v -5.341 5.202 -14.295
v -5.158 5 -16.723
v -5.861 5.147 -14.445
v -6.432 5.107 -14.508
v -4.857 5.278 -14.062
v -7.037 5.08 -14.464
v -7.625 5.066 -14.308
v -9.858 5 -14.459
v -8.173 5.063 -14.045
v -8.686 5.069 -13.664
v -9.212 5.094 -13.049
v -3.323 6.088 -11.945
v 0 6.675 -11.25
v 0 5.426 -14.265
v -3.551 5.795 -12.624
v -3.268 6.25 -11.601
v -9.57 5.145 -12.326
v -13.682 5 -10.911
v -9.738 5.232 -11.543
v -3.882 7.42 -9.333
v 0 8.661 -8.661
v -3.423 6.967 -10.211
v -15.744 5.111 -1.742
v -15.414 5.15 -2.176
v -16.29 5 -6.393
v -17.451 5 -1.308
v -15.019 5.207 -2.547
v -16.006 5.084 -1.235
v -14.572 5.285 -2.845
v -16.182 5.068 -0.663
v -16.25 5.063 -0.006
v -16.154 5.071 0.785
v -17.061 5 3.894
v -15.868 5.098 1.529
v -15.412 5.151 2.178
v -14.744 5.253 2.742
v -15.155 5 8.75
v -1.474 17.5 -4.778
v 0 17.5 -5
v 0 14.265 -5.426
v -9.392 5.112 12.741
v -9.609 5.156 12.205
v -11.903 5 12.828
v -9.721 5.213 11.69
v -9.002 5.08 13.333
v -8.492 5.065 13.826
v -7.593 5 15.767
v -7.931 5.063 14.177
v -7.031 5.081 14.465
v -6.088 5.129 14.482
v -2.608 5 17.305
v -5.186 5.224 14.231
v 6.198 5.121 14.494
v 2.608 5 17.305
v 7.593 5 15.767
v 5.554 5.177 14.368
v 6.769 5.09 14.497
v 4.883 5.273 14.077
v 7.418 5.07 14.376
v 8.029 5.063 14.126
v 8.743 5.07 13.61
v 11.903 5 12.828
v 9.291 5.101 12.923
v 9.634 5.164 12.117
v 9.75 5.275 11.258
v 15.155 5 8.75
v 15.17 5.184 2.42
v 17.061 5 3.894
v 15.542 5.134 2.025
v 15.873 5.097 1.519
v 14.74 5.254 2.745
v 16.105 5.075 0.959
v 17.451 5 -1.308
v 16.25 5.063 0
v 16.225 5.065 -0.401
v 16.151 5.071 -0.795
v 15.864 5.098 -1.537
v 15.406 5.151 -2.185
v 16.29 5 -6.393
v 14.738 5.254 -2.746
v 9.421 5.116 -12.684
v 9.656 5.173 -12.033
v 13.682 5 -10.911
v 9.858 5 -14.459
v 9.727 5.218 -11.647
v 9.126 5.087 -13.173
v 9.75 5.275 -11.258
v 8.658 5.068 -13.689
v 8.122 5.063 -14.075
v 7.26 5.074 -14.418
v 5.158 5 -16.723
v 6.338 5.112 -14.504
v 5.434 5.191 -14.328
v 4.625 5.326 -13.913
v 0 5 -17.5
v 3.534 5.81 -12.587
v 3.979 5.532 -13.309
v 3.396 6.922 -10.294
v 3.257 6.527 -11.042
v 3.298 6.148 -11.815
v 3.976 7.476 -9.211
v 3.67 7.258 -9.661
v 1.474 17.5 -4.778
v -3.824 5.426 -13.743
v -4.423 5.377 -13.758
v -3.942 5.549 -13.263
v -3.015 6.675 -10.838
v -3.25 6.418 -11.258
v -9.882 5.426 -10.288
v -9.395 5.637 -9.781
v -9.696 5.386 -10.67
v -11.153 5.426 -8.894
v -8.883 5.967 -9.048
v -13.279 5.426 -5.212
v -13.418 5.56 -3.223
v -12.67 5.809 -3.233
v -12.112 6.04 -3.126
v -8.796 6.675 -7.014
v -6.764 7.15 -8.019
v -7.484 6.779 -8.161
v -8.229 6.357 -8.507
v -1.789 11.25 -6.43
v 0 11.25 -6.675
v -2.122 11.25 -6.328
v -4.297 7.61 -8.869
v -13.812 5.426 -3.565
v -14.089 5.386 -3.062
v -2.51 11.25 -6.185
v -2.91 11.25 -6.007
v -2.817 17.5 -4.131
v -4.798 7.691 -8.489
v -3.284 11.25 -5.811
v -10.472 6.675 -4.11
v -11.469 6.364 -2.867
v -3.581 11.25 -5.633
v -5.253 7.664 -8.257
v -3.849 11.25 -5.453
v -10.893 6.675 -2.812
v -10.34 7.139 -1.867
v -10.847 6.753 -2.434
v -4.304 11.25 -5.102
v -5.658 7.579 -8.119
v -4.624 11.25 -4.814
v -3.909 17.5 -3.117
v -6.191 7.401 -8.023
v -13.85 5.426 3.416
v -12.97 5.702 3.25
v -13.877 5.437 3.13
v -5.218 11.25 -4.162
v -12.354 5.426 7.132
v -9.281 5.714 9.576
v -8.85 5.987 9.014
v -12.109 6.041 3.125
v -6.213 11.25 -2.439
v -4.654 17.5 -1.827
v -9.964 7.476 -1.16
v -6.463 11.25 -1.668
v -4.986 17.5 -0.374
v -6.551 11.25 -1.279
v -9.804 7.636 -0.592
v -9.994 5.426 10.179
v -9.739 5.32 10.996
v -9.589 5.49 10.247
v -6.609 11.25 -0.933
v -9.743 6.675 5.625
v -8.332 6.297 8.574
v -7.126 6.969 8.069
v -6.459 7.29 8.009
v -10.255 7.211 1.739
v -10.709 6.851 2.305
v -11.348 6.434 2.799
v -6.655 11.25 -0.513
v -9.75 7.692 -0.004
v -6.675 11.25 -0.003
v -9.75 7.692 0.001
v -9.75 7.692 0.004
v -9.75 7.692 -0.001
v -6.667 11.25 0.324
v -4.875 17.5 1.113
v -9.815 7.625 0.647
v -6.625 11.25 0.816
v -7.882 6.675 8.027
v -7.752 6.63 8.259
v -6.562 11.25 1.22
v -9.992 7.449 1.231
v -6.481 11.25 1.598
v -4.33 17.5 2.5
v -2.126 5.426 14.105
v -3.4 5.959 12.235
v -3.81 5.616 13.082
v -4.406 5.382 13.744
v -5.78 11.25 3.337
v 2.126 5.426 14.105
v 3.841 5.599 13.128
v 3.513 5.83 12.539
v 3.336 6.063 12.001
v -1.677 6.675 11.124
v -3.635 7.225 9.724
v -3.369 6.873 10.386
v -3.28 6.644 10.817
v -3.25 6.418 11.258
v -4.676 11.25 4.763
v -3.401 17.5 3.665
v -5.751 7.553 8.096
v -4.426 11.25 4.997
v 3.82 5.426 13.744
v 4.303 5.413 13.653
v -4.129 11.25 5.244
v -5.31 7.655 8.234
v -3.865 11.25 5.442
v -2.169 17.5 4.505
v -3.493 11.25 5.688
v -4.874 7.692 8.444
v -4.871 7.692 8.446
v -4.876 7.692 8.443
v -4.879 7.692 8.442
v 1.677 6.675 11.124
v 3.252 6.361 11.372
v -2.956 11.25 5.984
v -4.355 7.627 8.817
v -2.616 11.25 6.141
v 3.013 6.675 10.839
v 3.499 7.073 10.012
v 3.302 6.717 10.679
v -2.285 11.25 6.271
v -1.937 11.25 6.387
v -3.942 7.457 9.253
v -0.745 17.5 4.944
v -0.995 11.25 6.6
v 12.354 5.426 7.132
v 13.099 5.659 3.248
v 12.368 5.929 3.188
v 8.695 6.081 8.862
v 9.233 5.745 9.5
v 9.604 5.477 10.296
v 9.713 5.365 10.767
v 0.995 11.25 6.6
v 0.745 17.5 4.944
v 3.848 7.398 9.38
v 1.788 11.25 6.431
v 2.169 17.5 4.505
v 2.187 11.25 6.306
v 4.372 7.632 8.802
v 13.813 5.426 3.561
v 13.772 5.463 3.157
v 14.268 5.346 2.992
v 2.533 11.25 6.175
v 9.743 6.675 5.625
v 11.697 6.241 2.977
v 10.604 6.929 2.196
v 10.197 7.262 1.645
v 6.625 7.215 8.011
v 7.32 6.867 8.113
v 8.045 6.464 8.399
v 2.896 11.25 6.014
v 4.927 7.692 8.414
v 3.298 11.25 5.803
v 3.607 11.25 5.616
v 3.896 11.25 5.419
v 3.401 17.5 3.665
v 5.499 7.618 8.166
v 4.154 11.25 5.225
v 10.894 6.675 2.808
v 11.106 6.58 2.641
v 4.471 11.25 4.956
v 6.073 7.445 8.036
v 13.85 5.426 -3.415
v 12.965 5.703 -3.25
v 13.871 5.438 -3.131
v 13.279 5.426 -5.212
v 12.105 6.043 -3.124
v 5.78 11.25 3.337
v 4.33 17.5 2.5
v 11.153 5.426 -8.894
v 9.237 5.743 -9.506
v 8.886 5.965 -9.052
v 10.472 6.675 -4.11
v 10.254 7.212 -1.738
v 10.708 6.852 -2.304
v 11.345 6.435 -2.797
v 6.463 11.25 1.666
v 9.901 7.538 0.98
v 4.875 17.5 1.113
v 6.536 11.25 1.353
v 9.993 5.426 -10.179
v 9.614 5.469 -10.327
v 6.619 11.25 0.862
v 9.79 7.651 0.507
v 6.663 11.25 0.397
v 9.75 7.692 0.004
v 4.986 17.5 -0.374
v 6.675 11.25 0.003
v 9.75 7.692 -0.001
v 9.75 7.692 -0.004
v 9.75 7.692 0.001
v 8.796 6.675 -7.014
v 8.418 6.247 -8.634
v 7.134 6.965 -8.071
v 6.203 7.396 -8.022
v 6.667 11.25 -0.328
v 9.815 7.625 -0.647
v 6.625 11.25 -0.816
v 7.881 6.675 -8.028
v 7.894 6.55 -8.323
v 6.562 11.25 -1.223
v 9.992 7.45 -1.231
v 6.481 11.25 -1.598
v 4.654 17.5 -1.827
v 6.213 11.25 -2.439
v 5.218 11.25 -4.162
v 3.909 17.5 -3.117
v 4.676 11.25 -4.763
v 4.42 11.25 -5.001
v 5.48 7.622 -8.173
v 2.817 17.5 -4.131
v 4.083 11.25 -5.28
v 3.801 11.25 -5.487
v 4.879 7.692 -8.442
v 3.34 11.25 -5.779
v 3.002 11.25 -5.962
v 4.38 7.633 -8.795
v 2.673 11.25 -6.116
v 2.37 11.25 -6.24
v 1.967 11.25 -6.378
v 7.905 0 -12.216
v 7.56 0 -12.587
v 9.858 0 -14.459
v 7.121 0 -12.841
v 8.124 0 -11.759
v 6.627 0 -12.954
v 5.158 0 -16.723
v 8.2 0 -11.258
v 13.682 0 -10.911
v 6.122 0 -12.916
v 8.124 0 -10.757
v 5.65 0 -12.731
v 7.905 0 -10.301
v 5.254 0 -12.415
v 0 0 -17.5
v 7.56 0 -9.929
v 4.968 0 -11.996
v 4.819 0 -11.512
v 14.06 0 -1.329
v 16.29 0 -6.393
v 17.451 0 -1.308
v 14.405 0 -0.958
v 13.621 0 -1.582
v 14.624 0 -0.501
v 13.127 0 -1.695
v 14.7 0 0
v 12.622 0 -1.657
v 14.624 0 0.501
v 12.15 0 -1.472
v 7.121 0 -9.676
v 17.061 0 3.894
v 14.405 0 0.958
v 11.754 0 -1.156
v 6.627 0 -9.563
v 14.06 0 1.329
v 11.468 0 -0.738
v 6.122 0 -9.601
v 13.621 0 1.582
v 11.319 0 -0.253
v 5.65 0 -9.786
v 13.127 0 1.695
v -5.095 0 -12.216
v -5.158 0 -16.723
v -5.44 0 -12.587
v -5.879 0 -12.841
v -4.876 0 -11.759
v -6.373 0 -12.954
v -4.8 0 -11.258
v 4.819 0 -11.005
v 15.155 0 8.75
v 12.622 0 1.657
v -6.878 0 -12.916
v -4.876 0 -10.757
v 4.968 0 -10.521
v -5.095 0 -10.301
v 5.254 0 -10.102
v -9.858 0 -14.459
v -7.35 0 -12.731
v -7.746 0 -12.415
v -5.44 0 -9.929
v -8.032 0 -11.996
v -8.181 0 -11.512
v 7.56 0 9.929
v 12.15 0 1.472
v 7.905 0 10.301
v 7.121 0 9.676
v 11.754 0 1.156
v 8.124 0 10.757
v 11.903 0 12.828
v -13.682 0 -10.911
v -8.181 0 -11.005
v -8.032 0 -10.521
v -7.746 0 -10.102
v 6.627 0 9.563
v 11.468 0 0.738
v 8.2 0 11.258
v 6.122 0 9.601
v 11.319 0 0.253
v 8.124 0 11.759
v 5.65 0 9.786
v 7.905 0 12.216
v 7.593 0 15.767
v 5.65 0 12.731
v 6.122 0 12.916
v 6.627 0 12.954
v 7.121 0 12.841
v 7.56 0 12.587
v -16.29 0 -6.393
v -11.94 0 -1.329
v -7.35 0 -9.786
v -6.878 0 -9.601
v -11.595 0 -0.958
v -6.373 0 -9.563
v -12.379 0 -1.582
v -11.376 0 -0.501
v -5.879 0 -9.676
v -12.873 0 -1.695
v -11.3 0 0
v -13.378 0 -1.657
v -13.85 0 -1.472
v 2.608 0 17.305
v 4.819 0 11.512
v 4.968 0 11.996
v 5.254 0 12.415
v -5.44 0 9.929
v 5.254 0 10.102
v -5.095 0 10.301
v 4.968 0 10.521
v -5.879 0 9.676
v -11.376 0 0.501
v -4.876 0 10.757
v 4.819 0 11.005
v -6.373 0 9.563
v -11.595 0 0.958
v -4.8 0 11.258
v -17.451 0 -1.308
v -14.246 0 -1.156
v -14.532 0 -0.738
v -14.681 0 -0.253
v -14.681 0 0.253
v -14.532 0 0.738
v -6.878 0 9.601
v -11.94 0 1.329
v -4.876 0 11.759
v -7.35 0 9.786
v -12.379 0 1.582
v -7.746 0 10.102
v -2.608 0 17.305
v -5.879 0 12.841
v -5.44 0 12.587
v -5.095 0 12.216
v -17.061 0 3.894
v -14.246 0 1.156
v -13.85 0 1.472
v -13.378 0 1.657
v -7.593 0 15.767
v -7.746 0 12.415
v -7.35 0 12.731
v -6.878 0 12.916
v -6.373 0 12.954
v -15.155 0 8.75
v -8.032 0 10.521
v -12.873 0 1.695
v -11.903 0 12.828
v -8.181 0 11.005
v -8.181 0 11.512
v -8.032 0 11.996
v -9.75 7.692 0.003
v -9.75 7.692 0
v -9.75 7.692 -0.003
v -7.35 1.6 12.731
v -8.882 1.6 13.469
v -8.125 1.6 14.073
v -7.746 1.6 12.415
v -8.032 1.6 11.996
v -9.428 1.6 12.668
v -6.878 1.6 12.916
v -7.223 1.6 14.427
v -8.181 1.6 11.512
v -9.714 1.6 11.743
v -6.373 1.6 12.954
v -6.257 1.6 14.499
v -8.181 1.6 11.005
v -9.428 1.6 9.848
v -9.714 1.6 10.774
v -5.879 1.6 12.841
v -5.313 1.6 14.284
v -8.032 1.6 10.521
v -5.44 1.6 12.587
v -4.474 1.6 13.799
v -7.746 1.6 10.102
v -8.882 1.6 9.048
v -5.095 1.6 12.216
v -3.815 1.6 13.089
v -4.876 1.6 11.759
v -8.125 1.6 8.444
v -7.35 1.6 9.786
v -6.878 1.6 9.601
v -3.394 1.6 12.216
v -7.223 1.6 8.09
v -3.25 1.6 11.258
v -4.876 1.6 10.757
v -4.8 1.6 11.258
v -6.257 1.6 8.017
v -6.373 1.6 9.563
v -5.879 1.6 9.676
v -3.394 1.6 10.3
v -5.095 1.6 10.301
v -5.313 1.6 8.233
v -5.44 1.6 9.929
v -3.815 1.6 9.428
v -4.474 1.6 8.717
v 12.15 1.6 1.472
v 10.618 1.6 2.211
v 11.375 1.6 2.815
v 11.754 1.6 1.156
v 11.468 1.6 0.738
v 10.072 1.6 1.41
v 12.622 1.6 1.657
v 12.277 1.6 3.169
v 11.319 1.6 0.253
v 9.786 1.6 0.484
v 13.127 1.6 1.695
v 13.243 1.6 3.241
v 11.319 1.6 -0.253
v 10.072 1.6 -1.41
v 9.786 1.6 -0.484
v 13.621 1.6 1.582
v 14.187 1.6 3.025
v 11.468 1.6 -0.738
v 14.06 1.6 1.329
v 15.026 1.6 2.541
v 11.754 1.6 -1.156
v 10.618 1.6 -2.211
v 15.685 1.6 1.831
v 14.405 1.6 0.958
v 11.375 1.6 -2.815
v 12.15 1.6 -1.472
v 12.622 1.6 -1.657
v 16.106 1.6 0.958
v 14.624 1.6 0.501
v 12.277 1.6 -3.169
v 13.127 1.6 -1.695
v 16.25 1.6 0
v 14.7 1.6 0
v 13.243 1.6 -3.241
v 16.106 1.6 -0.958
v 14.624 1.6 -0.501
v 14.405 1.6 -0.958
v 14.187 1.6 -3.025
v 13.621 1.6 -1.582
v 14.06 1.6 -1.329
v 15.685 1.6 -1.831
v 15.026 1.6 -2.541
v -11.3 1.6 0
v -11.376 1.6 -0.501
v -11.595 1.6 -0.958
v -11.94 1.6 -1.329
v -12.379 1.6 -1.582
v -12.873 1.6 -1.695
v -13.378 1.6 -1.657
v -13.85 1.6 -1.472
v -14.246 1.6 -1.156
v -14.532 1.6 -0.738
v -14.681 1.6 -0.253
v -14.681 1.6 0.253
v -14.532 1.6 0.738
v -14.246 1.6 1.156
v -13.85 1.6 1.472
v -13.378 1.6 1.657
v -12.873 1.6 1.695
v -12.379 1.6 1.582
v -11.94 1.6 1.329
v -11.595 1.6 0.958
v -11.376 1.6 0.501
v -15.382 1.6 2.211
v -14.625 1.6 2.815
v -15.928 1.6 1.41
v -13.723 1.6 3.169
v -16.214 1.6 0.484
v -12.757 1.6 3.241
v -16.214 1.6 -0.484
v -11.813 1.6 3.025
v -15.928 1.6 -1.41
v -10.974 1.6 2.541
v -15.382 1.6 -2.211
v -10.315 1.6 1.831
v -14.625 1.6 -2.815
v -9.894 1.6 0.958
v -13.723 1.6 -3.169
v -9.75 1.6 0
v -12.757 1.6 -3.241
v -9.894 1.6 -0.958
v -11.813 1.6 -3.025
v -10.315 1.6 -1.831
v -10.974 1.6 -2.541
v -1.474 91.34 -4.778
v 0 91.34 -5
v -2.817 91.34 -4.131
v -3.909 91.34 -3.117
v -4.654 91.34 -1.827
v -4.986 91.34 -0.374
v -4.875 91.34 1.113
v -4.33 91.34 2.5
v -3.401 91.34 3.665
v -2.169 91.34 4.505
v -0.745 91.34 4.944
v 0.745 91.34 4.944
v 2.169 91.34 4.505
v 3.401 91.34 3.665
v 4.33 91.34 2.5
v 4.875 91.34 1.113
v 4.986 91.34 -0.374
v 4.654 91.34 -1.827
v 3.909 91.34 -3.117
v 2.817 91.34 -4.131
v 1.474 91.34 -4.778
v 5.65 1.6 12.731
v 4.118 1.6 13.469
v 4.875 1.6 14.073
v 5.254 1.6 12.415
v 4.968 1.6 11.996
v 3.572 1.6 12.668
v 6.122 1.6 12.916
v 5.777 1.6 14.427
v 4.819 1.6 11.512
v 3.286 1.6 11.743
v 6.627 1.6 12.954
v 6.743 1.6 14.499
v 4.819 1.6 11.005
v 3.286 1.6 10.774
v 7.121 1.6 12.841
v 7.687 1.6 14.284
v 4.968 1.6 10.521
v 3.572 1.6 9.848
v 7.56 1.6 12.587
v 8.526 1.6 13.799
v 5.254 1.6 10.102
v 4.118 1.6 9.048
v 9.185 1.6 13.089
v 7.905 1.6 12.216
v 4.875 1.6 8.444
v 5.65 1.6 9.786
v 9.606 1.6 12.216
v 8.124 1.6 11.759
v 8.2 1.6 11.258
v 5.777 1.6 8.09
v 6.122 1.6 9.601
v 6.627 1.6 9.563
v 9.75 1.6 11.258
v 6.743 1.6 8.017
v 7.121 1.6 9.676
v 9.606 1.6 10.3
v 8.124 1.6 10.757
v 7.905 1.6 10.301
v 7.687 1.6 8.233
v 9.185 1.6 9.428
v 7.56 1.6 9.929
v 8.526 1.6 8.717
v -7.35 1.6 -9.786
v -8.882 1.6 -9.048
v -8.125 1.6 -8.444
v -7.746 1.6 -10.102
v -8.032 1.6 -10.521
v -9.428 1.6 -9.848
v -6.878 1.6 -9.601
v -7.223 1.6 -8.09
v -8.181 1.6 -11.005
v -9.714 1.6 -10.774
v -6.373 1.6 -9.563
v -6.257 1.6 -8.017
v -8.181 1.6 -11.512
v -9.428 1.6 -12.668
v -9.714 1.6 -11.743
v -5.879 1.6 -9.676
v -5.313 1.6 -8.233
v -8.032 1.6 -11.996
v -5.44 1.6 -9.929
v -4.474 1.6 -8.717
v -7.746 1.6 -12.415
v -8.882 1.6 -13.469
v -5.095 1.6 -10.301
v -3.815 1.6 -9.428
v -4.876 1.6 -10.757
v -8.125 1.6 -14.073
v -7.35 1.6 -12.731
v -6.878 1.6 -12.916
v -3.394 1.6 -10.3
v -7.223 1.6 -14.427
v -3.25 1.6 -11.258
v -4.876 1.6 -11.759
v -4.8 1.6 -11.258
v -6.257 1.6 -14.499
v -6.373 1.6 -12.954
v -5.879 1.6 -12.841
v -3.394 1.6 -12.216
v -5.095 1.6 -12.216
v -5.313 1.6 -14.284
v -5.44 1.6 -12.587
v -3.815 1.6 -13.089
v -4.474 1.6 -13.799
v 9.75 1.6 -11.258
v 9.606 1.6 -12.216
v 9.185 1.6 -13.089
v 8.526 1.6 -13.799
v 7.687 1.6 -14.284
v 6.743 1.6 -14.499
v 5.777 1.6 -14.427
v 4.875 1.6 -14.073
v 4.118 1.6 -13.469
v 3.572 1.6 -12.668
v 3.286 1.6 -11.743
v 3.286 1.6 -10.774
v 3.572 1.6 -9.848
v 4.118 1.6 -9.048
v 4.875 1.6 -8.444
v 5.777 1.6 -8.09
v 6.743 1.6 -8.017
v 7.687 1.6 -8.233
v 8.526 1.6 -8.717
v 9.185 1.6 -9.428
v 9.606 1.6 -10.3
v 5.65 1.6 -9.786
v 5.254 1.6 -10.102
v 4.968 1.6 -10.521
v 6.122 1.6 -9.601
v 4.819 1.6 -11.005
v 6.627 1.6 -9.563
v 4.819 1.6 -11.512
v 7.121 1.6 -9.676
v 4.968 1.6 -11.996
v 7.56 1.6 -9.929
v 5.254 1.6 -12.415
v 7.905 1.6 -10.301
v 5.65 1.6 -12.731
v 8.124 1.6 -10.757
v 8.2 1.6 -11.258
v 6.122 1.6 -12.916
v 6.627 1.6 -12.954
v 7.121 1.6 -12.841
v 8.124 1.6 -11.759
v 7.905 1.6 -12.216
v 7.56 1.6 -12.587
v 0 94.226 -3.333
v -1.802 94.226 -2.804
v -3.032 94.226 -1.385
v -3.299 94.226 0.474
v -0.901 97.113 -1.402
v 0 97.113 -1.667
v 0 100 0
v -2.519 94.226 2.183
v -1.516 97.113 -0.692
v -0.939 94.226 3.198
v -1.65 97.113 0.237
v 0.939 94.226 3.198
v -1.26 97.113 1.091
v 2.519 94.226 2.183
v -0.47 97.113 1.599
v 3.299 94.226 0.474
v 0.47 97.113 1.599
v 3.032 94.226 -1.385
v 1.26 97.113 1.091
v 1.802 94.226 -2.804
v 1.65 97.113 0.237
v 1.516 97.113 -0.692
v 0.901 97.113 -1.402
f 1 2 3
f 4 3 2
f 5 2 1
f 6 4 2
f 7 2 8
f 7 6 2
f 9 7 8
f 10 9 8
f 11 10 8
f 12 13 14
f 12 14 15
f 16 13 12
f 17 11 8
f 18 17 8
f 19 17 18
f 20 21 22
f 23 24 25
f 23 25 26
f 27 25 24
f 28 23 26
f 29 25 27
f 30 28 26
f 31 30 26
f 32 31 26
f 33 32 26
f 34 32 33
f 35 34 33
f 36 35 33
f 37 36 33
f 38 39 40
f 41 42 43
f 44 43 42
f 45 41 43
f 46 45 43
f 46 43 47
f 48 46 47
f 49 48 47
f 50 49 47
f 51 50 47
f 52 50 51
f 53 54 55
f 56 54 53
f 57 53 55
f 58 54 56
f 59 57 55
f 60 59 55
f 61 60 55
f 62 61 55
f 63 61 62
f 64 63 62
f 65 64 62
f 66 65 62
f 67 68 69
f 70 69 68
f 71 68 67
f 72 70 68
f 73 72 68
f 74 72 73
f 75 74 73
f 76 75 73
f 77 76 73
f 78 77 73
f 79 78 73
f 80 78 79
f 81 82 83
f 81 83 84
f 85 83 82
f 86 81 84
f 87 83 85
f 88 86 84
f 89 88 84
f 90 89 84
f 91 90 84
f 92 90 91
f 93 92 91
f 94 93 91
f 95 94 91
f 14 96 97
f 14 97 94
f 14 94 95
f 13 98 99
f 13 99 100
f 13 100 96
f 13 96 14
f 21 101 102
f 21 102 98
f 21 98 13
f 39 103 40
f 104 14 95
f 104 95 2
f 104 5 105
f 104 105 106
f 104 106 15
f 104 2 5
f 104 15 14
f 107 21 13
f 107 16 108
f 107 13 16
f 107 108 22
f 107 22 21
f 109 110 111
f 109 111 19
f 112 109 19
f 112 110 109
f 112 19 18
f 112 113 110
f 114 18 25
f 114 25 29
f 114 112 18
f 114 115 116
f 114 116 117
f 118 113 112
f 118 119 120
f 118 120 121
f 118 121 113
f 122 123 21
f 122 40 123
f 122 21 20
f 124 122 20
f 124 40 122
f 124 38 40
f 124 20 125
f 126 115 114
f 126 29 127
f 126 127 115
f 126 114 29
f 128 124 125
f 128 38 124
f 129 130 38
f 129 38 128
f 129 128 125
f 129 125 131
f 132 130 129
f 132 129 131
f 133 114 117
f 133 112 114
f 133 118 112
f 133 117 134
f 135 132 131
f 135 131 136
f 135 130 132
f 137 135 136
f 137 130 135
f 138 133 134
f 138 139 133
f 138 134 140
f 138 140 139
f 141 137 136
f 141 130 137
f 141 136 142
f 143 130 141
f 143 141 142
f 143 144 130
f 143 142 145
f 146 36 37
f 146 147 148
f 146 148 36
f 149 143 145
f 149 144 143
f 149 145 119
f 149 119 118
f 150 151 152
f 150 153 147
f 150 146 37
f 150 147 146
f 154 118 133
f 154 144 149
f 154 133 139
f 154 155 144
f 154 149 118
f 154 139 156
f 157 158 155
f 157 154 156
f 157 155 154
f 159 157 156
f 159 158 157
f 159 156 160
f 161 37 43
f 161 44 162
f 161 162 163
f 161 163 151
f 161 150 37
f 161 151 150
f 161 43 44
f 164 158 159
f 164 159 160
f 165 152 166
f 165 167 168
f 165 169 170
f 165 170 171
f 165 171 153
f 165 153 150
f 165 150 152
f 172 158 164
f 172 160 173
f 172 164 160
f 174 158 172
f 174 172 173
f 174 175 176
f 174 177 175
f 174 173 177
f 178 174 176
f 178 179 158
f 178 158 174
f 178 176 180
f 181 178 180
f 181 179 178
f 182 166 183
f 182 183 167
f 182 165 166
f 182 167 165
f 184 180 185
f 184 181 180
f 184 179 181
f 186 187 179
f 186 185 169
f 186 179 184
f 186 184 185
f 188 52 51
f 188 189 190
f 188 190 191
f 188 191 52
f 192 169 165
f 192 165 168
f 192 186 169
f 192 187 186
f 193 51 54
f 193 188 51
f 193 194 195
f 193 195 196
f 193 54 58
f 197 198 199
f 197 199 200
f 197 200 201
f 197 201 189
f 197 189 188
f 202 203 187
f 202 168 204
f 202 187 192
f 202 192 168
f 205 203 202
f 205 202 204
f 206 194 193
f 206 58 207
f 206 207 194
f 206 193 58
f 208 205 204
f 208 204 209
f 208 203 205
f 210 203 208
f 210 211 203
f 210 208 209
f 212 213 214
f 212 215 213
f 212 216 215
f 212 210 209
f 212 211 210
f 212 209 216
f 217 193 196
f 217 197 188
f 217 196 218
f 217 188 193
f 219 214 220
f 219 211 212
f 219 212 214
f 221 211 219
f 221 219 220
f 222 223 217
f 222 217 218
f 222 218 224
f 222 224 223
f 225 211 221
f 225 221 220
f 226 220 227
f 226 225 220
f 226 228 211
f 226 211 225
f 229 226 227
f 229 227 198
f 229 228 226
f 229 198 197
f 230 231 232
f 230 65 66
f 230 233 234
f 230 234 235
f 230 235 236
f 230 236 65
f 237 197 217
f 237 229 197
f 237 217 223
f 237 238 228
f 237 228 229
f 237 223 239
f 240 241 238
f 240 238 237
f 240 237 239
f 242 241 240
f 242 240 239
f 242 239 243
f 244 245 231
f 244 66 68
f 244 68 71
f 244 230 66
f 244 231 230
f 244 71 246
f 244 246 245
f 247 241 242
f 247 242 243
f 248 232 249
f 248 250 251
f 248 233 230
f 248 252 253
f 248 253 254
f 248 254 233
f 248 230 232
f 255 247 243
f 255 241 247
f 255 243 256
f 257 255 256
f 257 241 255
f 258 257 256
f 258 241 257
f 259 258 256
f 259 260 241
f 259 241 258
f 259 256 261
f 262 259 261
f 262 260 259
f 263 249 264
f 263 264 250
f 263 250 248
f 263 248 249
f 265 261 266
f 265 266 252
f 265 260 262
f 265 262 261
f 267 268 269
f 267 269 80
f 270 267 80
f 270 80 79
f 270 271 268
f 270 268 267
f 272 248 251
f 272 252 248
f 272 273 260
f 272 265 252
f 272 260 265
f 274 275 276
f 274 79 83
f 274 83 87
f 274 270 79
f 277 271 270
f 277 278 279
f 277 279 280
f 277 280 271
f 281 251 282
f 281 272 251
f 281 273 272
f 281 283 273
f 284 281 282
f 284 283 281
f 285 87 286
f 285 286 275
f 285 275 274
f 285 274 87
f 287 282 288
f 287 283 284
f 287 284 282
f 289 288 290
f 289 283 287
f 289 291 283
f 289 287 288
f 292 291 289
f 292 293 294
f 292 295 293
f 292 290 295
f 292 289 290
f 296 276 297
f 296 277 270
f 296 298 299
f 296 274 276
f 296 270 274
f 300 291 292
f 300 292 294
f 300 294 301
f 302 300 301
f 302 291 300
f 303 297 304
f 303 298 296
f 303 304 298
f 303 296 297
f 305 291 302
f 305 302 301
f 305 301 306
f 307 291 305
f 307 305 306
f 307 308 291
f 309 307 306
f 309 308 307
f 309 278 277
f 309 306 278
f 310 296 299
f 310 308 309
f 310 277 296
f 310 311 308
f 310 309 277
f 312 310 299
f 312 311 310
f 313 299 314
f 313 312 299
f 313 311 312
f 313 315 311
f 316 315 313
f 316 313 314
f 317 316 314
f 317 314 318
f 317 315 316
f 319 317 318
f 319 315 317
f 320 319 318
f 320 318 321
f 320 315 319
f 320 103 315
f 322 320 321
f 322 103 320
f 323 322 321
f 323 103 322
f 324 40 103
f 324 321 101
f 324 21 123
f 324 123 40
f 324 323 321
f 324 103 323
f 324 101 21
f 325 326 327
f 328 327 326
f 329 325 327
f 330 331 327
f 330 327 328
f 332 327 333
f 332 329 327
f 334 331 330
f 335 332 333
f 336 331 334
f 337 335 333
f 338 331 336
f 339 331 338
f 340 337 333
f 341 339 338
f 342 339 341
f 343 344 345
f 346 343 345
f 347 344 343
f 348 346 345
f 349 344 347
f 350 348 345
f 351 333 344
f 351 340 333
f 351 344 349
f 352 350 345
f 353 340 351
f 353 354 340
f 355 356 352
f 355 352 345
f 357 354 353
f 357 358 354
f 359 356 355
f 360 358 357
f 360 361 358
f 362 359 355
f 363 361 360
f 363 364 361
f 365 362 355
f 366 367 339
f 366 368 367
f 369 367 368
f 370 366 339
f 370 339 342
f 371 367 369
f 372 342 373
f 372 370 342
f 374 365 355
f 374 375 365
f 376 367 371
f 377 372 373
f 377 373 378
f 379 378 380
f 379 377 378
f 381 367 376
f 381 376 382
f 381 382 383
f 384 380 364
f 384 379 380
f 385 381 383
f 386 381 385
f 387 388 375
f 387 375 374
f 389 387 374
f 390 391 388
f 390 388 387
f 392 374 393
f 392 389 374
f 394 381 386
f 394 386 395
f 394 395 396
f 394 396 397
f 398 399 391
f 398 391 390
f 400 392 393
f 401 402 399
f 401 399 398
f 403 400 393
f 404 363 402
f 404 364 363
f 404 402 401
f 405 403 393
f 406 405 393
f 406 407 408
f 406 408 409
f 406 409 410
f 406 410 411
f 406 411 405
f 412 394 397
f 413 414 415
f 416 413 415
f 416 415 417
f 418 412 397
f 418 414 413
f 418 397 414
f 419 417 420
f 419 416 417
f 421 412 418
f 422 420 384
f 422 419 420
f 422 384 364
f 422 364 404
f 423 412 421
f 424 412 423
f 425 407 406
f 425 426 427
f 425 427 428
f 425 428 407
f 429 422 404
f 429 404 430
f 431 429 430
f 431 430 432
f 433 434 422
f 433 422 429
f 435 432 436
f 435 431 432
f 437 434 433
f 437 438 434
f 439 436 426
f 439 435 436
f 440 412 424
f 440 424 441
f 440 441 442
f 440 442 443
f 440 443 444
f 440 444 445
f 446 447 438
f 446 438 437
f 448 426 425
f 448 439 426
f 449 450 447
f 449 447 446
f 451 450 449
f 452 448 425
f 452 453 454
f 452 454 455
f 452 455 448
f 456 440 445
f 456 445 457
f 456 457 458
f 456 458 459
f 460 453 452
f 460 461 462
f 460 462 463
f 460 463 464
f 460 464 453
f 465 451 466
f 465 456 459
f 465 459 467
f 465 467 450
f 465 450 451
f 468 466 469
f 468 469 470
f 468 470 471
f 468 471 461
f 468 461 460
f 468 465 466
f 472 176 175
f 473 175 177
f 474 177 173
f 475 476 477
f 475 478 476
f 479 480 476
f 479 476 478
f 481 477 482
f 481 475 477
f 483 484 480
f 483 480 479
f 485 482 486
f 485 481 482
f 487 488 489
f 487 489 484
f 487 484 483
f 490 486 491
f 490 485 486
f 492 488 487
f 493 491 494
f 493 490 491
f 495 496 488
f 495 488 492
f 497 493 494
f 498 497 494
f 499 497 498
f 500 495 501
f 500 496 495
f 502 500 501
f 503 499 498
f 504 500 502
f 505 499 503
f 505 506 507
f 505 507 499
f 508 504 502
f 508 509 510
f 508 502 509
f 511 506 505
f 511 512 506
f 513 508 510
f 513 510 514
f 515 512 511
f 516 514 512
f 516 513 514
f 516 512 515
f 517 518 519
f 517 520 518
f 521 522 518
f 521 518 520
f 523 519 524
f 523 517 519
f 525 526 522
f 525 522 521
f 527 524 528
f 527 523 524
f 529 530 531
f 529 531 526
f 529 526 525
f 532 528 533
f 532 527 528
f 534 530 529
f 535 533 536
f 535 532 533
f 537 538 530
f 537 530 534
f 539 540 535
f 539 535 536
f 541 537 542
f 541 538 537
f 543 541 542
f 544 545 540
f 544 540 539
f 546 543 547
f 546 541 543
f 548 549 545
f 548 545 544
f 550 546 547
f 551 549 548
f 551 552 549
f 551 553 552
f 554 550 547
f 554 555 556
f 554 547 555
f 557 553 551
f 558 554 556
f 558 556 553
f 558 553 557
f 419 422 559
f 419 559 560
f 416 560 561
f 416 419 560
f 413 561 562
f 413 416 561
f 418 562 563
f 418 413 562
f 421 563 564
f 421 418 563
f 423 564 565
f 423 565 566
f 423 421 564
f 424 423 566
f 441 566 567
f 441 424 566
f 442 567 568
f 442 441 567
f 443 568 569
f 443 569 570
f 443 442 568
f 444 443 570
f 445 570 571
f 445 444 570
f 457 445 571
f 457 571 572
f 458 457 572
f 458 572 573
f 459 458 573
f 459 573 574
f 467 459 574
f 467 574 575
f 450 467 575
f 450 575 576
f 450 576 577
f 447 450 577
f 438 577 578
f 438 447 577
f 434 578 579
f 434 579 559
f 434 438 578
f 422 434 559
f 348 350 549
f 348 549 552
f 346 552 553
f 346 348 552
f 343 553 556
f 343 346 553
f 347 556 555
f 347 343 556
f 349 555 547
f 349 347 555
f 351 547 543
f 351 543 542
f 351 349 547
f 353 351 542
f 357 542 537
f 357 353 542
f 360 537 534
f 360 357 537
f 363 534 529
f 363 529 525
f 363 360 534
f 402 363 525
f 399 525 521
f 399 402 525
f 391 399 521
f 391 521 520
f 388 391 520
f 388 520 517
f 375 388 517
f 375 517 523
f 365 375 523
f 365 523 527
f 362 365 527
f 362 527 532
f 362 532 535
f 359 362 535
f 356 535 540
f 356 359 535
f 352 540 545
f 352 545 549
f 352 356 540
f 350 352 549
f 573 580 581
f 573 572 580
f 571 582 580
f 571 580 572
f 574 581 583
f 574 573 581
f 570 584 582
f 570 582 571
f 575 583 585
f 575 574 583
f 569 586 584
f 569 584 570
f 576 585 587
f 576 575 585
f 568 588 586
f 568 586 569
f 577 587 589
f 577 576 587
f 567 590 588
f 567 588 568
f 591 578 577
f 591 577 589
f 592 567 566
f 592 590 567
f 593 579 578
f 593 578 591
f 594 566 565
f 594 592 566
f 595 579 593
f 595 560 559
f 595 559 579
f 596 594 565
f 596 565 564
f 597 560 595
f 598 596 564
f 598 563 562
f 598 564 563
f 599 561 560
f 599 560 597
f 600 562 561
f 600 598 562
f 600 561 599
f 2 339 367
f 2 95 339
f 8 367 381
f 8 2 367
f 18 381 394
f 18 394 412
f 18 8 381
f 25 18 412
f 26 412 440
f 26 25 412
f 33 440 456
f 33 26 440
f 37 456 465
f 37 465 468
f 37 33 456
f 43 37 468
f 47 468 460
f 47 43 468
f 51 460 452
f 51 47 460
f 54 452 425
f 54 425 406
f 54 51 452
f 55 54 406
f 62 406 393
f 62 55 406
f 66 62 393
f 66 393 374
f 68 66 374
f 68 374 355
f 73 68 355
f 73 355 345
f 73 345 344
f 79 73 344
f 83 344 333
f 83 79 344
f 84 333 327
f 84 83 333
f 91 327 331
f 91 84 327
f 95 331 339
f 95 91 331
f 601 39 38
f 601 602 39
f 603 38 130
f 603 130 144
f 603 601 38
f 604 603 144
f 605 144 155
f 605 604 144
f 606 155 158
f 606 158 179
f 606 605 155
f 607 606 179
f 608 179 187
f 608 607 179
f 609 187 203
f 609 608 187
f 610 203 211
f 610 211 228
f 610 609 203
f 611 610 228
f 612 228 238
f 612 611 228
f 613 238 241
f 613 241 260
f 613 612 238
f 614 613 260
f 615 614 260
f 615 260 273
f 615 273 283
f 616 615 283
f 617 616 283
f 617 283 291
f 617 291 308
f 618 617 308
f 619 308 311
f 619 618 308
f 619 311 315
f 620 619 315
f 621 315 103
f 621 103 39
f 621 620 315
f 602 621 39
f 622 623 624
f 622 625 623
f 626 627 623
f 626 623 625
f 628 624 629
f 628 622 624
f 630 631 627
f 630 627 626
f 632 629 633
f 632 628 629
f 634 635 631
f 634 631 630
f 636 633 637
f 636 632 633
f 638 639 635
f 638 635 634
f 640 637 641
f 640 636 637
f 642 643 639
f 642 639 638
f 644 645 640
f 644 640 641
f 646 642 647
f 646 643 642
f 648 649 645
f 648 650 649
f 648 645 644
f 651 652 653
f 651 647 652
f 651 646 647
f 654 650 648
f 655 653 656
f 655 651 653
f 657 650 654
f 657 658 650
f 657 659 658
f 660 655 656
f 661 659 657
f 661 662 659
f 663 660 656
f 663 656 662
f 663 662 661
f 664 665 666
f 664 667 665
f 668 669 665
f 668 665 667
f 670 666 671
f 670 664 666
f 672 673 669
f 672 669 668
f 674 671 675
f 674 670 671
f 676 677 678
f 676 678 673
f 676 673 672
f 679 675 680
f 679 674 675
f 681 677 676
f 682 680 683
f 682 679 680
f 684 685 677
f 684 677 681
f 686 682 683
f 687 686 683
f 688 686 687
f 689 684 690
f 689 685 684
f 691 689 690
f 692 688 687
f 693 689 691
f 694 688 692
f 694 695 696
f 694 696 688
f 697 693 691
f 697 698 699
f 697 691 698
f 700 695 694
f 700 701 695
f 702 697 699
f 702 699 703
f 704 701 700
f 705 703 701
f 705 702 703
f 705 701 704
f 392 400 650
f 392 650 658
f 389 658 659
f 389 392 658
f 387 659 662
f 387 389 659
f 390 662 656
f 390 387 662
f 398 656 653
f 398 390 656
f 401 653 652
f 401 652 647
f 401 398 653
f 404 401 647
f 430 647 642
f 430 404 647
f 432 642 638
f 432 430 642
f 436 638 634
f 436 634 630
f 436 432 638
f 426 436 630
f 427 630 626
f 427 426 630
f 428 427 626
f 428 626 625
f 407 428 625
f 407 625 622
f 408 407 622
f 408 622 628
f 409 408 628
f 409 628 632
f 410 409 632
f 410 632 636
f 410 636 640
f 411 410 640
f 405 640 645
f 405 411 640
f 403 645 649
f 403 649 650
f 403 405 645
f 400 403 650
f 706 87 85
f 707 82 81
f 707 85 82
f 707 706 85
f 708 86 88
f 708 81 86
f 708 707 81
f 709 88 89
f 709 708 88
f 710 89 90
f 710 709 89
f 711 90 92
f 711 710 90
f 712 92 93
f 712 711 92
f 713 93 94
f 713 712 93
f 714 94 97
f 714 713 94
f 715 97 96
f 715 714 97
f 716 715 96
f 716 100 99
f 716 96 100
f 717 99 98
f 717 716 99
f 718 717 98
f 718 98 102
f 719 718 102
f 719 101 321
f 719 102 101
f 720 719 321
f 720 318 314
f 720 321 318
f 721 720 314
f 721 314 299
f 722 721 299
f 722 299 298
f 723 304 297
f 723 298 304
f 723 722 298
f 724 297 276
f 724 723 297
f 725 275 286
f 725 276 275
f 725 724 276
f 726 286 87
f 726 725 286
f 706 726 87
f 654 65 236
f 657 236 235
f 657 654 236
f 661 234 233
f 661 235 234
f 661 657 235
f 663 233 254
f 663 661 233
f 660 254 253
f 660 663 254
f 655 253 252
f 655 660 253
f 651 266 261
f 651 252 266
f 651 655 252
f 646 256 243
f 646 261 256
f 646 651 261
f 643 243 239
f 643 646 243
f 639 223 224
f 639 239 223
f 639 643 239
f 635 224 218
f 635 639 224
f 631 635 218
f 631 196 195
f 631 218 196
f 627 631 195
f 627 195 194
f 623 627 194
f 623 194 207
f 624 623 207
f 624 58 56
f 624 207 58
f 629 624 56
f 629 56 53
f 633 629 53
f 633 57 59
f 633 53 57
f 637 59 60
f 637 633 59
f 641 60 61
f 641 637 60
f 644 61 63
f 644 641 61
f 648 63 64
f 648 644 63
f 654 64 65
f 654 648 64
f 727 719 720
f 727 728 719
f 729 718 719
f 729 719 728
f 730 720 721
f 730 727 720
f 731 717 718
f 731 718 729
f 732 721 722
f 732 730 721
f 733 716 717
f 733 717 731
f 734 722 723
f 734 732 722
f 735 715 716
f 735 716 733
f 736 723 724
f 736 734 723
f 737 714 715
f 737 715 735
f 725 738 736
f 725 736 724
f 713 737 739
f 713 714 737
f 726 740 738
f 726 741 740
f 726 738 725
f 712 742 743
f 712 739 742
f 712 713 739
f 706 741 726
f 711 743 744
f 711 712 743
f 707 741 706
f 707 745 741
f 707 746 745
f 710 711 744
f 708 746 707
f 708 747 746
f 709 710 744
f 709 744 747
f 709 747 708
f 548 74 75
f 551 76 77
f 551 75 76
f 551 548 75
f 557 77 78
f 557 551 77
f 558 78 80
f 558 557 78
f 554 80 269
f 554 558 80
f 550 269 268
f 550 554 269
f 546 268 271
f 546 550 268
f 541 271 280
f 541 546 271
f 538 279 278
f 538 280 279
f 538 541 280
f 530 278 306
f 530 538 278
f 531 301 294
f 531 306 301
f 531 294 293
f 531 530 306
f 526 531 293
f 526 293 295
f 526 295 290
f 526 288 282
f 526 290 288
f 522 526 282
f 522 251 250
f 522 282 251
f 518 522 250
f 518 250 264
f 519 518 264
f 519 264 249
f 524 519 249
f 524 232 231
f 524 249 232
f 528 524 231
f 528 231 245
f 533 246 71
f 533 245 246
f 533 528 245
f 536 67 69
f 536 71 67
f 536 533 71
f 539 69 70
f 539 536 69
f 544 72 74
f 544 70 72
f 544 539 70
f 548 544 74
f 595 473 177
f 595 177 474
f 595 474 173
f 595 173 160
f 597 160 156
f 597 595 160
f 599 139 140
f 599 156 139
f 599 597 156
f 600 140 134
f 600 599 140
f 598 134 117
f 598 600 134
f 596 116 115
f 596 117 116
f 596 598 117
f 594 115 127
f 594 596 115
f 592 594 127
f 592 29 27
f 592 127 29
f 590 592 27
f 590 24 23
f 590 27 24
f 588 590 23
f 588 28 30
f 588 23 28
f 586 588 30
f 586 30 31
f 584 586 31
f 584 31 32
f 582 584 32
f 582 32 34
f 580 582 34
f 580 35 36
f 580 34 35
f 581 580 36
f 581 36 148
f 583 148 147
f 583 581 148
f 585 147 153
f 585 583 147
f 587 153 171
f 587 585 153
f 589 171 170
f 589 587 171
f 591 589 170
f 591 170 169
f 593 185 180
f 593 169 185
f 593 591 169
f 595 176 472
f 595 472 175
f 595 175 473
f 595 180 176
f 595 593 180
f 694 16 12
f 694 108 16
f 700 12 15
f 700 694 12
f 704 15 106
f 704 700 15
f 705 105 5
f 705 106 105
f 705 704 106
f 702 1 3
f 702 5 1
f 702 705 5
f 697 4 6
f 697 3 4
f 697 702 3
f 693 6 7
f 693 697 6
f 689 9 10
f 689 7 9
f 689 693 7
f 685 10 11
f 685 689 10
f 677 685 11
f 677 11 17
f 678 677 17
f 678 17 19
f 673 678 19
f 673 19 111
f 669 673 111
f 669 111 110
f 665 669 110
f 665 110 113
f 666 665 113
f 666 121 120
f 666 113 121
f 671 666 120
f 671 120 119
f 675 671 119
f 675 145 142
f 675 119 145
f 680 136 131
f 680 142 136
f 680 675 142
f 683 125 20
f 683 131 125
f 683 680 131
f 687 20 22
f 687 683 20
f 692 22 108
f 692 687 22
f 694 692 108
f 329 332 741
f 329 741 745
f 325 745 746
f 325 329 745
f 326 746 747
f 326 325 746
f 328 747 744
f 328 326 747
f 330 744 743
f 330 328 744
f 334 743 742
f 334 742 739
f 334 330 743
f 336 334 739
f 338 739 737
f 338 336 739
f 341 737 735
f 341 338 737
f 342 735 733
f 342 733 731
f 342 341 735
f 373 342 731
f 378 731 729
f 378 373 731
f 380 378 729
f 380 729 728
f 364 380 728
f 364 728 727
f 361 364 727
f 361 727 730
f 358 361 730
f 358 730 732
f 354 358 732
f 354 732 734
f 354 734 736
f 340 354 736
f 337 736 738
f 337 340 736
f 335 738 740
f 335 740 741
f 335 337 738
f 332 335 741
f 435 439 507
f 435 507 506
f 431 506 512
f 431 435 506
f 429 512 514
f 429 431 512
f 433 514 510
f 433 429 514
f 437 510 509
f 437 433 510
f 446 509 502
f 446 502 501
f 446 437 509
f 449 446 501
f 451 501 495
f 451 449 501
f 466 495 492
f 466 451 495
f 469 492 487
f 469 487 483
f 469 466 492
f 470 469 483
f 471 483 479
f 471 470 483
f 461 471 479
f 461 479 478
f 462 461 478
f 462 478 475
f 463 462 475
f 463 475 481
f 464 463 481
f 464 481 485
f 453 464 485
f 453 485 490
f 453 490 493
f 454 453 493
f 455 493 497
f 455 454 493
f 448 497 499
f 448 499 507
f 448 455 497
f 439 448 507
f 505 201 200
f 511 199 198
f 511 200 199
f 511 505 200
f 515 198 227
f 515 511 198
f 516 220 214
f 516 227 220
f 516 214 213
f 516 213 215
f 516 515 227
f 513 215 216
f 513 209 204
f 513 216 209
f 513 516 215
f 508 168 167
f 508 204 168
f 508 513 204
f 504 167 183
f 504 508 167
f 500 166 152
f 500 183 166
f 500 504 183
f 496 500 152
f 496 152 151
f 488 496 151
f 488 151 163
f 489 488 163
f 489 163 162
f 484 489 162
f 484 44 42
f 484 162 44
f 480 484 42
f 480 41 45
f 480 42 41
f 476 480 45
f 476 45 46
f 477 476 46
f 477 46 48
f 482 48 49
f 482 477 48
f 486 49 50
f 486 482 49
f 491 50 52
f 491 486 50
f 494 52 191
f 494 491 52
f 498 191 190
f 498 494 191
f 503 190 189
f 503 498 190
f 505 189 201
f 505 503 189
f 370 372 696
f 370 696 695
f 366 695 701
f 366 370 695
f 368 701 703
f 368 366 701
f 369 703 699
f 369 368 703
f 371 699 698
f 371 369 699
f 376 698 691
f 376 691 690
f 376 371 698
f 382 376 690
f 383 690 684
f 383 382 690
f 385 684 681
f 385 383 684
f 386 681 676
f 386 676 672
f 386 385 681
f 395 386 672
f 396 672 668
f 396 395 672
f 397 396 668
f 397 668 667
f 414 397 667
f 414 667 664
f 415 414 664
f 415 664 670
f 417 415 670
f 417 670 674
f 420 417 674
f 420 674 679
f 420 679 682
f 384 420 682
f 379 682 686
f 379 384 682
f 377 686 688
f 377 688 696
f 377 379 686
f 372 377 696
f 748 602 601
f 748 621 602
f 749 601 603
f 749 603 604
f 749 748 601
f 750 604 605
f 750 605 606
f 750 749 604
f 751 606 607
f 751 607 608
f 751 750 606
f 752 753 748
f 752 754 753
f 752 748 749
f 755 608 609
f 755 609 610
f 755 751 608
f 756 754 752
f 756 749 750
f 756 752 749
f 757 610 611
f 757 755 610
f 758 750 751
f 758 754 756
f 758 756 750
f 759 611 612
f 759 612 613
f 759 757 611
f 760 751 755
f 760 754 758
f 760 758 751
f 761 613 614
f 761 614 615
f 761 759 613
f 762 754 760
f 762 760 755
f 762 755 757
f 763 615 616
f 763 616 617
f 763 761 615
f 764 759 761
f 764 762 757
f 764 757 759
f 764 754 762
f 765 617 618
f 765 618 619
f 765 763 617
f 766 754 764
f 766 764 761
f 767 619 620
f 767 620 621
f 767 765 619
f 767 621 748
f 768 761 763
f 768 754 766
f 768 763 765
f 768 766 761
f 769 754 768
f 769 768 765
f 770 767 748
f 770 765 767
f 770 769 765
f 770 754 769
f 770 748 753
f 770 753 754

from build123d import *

# Parameters (mm, degrees)
CBORE_START                                   = 1.6
CBORE_FOR_M3_HEX_SOCKET_HEAD_CAP_SCR_2_R      = 3.25
CBORE_FOR_M3_HEX_SOCKET_HEAD_CAP_SCREW1_DEPTH = 6.092474541
CBORE_FOR_M3_HEX_SOCKET_HEAD_CAP_SCR_3_O_R    = 1.7
CBORE_FOR_M3_HEX_SOCKET_HEAD_CAP_SCR_3_DEPTH  = 1.6


with BuildPart() as part:
    # Sketch1 → Revolve1 (revolve)
    with BuildSketch(Plane.XY, mode=Mode.PRIVATE) as revolve1_sk:
        with BuildLine():
            Line((0, 0), (17.5, 0))
            Line((17.5, 0), (17.5, 5))
            ThreePointArc((17.5, 5), (8.661165235, 8.661165235), (5, 17.5))
            Line((5, 17.5), (5, 91.339745962))
            Line((5, 91.339745962), (0, 100))
            Line((0, 100), (0, 0))
        make_face()
    revolve(revolve1_sk.sketch.rotate(Axis((0, 0, 0), (0, 1, 0)), 90), axis=Axis((0, 0, 0), (0, 1, 0)))

    # CBORE for M3 Hex Socket Head Cap Screw1: read off the stored shape, not the designer's step
    # CBORE for M3 Hex Socket Head Cap Scr 2 → CBORE for M3 Hex Socket Head Cap Screw1 (cut)
    with BuildSketch(Plane(origin=(0, 0, 0), x_dir=(1, 0, 0), z_dir=(0, 1, 0)).offset(CBORE_START)):
        with Locations((-6.5, -11.258330249)):
            Circle(CBORE_FOR_M3_HEX_SOCKET_HEAD_CAP_SCR_2_R)
        with Locations((6.5, -11.258330249)):
            Circle(CBORE_FOR_M3_HEX_SOCKET_HEAD_CAP_SCR_2_R)
        with Locations((13, 0)):
            Circle(CBORE_FOR_M3_HEX_SOCKET_HEAD_CAP_SCR_2_R)
        with Locations((6.5, 11.258330249)):
            Circle(CBORE_FOR_M3_HEX_SOCKET_HEAD_CAP_SCR_2_R)
        with Locations((-6.5, 11.258330249)):
            Circle(CBORE_FOR_M3_HEX_SOCKET_HEAD_CAP_SCR_2_R)
        with Locations((-13, 0)):
            Circle(CBORE_FOR_M3_HEX_SOCKET_HEAD_CAP_SCR_2_R)
    extrude(amount=CBORE_FOR_M3_HEX_SOCKET_HEAD_CAP_SCREW1_DEPTH, mode=Mode.SUBTRACT)

    # CBORE for M3 Hex Socket Head Cap Scr 3 o → CBORE for M3 Hex Socket Head Cap Scr 3 (cut)
    with BuildSketch(Plane(origin=(0, 0, 0), x_dir=(1, 0, 0), z_dir=(0, 1, 0))):
        with Locations((-6.5, -11.258330249)):
            Circle(CBORE_FOR_M3_HEX_SOCKET_HEAD_CAP_SCR_3_O_R)
        with Locations((6.5, -11.258330249)):
            Circle(CBORE_FOR_M3_HEX_SOCKET_HEAD_CAP_SCR_3_O_R)
        with Locations((13, 0)):
            Circle(CBORE_FOR_M3_HEX_SOCKET_HEAD_CAP_SCR_3_O_R)
        with Locations((6.5, 11.258330249)):
            Circle(CBORE_FOR_M3_HEX_SOCKET_HEAD_CAP_SCR_3_O_R)
        with Locations((-6.5, 11.258330249)):
            Circle(CBORE_FOR_M3_HEX_SOCKET_HEAD_CAP_SCR_3_O_R)
        with Locations((-13, 0)):
            Circle(CBORE_FOR_M3_HEX_SOCKET_HEAD_CAP_SCR_3_O_R)
    extrude(amount=CBORE_FOR_M3_HEX_SOCKET_HEAD_CAP_SCR_3_DEPTH, mode=Mode.SUBTRACT)


solid = part.part
